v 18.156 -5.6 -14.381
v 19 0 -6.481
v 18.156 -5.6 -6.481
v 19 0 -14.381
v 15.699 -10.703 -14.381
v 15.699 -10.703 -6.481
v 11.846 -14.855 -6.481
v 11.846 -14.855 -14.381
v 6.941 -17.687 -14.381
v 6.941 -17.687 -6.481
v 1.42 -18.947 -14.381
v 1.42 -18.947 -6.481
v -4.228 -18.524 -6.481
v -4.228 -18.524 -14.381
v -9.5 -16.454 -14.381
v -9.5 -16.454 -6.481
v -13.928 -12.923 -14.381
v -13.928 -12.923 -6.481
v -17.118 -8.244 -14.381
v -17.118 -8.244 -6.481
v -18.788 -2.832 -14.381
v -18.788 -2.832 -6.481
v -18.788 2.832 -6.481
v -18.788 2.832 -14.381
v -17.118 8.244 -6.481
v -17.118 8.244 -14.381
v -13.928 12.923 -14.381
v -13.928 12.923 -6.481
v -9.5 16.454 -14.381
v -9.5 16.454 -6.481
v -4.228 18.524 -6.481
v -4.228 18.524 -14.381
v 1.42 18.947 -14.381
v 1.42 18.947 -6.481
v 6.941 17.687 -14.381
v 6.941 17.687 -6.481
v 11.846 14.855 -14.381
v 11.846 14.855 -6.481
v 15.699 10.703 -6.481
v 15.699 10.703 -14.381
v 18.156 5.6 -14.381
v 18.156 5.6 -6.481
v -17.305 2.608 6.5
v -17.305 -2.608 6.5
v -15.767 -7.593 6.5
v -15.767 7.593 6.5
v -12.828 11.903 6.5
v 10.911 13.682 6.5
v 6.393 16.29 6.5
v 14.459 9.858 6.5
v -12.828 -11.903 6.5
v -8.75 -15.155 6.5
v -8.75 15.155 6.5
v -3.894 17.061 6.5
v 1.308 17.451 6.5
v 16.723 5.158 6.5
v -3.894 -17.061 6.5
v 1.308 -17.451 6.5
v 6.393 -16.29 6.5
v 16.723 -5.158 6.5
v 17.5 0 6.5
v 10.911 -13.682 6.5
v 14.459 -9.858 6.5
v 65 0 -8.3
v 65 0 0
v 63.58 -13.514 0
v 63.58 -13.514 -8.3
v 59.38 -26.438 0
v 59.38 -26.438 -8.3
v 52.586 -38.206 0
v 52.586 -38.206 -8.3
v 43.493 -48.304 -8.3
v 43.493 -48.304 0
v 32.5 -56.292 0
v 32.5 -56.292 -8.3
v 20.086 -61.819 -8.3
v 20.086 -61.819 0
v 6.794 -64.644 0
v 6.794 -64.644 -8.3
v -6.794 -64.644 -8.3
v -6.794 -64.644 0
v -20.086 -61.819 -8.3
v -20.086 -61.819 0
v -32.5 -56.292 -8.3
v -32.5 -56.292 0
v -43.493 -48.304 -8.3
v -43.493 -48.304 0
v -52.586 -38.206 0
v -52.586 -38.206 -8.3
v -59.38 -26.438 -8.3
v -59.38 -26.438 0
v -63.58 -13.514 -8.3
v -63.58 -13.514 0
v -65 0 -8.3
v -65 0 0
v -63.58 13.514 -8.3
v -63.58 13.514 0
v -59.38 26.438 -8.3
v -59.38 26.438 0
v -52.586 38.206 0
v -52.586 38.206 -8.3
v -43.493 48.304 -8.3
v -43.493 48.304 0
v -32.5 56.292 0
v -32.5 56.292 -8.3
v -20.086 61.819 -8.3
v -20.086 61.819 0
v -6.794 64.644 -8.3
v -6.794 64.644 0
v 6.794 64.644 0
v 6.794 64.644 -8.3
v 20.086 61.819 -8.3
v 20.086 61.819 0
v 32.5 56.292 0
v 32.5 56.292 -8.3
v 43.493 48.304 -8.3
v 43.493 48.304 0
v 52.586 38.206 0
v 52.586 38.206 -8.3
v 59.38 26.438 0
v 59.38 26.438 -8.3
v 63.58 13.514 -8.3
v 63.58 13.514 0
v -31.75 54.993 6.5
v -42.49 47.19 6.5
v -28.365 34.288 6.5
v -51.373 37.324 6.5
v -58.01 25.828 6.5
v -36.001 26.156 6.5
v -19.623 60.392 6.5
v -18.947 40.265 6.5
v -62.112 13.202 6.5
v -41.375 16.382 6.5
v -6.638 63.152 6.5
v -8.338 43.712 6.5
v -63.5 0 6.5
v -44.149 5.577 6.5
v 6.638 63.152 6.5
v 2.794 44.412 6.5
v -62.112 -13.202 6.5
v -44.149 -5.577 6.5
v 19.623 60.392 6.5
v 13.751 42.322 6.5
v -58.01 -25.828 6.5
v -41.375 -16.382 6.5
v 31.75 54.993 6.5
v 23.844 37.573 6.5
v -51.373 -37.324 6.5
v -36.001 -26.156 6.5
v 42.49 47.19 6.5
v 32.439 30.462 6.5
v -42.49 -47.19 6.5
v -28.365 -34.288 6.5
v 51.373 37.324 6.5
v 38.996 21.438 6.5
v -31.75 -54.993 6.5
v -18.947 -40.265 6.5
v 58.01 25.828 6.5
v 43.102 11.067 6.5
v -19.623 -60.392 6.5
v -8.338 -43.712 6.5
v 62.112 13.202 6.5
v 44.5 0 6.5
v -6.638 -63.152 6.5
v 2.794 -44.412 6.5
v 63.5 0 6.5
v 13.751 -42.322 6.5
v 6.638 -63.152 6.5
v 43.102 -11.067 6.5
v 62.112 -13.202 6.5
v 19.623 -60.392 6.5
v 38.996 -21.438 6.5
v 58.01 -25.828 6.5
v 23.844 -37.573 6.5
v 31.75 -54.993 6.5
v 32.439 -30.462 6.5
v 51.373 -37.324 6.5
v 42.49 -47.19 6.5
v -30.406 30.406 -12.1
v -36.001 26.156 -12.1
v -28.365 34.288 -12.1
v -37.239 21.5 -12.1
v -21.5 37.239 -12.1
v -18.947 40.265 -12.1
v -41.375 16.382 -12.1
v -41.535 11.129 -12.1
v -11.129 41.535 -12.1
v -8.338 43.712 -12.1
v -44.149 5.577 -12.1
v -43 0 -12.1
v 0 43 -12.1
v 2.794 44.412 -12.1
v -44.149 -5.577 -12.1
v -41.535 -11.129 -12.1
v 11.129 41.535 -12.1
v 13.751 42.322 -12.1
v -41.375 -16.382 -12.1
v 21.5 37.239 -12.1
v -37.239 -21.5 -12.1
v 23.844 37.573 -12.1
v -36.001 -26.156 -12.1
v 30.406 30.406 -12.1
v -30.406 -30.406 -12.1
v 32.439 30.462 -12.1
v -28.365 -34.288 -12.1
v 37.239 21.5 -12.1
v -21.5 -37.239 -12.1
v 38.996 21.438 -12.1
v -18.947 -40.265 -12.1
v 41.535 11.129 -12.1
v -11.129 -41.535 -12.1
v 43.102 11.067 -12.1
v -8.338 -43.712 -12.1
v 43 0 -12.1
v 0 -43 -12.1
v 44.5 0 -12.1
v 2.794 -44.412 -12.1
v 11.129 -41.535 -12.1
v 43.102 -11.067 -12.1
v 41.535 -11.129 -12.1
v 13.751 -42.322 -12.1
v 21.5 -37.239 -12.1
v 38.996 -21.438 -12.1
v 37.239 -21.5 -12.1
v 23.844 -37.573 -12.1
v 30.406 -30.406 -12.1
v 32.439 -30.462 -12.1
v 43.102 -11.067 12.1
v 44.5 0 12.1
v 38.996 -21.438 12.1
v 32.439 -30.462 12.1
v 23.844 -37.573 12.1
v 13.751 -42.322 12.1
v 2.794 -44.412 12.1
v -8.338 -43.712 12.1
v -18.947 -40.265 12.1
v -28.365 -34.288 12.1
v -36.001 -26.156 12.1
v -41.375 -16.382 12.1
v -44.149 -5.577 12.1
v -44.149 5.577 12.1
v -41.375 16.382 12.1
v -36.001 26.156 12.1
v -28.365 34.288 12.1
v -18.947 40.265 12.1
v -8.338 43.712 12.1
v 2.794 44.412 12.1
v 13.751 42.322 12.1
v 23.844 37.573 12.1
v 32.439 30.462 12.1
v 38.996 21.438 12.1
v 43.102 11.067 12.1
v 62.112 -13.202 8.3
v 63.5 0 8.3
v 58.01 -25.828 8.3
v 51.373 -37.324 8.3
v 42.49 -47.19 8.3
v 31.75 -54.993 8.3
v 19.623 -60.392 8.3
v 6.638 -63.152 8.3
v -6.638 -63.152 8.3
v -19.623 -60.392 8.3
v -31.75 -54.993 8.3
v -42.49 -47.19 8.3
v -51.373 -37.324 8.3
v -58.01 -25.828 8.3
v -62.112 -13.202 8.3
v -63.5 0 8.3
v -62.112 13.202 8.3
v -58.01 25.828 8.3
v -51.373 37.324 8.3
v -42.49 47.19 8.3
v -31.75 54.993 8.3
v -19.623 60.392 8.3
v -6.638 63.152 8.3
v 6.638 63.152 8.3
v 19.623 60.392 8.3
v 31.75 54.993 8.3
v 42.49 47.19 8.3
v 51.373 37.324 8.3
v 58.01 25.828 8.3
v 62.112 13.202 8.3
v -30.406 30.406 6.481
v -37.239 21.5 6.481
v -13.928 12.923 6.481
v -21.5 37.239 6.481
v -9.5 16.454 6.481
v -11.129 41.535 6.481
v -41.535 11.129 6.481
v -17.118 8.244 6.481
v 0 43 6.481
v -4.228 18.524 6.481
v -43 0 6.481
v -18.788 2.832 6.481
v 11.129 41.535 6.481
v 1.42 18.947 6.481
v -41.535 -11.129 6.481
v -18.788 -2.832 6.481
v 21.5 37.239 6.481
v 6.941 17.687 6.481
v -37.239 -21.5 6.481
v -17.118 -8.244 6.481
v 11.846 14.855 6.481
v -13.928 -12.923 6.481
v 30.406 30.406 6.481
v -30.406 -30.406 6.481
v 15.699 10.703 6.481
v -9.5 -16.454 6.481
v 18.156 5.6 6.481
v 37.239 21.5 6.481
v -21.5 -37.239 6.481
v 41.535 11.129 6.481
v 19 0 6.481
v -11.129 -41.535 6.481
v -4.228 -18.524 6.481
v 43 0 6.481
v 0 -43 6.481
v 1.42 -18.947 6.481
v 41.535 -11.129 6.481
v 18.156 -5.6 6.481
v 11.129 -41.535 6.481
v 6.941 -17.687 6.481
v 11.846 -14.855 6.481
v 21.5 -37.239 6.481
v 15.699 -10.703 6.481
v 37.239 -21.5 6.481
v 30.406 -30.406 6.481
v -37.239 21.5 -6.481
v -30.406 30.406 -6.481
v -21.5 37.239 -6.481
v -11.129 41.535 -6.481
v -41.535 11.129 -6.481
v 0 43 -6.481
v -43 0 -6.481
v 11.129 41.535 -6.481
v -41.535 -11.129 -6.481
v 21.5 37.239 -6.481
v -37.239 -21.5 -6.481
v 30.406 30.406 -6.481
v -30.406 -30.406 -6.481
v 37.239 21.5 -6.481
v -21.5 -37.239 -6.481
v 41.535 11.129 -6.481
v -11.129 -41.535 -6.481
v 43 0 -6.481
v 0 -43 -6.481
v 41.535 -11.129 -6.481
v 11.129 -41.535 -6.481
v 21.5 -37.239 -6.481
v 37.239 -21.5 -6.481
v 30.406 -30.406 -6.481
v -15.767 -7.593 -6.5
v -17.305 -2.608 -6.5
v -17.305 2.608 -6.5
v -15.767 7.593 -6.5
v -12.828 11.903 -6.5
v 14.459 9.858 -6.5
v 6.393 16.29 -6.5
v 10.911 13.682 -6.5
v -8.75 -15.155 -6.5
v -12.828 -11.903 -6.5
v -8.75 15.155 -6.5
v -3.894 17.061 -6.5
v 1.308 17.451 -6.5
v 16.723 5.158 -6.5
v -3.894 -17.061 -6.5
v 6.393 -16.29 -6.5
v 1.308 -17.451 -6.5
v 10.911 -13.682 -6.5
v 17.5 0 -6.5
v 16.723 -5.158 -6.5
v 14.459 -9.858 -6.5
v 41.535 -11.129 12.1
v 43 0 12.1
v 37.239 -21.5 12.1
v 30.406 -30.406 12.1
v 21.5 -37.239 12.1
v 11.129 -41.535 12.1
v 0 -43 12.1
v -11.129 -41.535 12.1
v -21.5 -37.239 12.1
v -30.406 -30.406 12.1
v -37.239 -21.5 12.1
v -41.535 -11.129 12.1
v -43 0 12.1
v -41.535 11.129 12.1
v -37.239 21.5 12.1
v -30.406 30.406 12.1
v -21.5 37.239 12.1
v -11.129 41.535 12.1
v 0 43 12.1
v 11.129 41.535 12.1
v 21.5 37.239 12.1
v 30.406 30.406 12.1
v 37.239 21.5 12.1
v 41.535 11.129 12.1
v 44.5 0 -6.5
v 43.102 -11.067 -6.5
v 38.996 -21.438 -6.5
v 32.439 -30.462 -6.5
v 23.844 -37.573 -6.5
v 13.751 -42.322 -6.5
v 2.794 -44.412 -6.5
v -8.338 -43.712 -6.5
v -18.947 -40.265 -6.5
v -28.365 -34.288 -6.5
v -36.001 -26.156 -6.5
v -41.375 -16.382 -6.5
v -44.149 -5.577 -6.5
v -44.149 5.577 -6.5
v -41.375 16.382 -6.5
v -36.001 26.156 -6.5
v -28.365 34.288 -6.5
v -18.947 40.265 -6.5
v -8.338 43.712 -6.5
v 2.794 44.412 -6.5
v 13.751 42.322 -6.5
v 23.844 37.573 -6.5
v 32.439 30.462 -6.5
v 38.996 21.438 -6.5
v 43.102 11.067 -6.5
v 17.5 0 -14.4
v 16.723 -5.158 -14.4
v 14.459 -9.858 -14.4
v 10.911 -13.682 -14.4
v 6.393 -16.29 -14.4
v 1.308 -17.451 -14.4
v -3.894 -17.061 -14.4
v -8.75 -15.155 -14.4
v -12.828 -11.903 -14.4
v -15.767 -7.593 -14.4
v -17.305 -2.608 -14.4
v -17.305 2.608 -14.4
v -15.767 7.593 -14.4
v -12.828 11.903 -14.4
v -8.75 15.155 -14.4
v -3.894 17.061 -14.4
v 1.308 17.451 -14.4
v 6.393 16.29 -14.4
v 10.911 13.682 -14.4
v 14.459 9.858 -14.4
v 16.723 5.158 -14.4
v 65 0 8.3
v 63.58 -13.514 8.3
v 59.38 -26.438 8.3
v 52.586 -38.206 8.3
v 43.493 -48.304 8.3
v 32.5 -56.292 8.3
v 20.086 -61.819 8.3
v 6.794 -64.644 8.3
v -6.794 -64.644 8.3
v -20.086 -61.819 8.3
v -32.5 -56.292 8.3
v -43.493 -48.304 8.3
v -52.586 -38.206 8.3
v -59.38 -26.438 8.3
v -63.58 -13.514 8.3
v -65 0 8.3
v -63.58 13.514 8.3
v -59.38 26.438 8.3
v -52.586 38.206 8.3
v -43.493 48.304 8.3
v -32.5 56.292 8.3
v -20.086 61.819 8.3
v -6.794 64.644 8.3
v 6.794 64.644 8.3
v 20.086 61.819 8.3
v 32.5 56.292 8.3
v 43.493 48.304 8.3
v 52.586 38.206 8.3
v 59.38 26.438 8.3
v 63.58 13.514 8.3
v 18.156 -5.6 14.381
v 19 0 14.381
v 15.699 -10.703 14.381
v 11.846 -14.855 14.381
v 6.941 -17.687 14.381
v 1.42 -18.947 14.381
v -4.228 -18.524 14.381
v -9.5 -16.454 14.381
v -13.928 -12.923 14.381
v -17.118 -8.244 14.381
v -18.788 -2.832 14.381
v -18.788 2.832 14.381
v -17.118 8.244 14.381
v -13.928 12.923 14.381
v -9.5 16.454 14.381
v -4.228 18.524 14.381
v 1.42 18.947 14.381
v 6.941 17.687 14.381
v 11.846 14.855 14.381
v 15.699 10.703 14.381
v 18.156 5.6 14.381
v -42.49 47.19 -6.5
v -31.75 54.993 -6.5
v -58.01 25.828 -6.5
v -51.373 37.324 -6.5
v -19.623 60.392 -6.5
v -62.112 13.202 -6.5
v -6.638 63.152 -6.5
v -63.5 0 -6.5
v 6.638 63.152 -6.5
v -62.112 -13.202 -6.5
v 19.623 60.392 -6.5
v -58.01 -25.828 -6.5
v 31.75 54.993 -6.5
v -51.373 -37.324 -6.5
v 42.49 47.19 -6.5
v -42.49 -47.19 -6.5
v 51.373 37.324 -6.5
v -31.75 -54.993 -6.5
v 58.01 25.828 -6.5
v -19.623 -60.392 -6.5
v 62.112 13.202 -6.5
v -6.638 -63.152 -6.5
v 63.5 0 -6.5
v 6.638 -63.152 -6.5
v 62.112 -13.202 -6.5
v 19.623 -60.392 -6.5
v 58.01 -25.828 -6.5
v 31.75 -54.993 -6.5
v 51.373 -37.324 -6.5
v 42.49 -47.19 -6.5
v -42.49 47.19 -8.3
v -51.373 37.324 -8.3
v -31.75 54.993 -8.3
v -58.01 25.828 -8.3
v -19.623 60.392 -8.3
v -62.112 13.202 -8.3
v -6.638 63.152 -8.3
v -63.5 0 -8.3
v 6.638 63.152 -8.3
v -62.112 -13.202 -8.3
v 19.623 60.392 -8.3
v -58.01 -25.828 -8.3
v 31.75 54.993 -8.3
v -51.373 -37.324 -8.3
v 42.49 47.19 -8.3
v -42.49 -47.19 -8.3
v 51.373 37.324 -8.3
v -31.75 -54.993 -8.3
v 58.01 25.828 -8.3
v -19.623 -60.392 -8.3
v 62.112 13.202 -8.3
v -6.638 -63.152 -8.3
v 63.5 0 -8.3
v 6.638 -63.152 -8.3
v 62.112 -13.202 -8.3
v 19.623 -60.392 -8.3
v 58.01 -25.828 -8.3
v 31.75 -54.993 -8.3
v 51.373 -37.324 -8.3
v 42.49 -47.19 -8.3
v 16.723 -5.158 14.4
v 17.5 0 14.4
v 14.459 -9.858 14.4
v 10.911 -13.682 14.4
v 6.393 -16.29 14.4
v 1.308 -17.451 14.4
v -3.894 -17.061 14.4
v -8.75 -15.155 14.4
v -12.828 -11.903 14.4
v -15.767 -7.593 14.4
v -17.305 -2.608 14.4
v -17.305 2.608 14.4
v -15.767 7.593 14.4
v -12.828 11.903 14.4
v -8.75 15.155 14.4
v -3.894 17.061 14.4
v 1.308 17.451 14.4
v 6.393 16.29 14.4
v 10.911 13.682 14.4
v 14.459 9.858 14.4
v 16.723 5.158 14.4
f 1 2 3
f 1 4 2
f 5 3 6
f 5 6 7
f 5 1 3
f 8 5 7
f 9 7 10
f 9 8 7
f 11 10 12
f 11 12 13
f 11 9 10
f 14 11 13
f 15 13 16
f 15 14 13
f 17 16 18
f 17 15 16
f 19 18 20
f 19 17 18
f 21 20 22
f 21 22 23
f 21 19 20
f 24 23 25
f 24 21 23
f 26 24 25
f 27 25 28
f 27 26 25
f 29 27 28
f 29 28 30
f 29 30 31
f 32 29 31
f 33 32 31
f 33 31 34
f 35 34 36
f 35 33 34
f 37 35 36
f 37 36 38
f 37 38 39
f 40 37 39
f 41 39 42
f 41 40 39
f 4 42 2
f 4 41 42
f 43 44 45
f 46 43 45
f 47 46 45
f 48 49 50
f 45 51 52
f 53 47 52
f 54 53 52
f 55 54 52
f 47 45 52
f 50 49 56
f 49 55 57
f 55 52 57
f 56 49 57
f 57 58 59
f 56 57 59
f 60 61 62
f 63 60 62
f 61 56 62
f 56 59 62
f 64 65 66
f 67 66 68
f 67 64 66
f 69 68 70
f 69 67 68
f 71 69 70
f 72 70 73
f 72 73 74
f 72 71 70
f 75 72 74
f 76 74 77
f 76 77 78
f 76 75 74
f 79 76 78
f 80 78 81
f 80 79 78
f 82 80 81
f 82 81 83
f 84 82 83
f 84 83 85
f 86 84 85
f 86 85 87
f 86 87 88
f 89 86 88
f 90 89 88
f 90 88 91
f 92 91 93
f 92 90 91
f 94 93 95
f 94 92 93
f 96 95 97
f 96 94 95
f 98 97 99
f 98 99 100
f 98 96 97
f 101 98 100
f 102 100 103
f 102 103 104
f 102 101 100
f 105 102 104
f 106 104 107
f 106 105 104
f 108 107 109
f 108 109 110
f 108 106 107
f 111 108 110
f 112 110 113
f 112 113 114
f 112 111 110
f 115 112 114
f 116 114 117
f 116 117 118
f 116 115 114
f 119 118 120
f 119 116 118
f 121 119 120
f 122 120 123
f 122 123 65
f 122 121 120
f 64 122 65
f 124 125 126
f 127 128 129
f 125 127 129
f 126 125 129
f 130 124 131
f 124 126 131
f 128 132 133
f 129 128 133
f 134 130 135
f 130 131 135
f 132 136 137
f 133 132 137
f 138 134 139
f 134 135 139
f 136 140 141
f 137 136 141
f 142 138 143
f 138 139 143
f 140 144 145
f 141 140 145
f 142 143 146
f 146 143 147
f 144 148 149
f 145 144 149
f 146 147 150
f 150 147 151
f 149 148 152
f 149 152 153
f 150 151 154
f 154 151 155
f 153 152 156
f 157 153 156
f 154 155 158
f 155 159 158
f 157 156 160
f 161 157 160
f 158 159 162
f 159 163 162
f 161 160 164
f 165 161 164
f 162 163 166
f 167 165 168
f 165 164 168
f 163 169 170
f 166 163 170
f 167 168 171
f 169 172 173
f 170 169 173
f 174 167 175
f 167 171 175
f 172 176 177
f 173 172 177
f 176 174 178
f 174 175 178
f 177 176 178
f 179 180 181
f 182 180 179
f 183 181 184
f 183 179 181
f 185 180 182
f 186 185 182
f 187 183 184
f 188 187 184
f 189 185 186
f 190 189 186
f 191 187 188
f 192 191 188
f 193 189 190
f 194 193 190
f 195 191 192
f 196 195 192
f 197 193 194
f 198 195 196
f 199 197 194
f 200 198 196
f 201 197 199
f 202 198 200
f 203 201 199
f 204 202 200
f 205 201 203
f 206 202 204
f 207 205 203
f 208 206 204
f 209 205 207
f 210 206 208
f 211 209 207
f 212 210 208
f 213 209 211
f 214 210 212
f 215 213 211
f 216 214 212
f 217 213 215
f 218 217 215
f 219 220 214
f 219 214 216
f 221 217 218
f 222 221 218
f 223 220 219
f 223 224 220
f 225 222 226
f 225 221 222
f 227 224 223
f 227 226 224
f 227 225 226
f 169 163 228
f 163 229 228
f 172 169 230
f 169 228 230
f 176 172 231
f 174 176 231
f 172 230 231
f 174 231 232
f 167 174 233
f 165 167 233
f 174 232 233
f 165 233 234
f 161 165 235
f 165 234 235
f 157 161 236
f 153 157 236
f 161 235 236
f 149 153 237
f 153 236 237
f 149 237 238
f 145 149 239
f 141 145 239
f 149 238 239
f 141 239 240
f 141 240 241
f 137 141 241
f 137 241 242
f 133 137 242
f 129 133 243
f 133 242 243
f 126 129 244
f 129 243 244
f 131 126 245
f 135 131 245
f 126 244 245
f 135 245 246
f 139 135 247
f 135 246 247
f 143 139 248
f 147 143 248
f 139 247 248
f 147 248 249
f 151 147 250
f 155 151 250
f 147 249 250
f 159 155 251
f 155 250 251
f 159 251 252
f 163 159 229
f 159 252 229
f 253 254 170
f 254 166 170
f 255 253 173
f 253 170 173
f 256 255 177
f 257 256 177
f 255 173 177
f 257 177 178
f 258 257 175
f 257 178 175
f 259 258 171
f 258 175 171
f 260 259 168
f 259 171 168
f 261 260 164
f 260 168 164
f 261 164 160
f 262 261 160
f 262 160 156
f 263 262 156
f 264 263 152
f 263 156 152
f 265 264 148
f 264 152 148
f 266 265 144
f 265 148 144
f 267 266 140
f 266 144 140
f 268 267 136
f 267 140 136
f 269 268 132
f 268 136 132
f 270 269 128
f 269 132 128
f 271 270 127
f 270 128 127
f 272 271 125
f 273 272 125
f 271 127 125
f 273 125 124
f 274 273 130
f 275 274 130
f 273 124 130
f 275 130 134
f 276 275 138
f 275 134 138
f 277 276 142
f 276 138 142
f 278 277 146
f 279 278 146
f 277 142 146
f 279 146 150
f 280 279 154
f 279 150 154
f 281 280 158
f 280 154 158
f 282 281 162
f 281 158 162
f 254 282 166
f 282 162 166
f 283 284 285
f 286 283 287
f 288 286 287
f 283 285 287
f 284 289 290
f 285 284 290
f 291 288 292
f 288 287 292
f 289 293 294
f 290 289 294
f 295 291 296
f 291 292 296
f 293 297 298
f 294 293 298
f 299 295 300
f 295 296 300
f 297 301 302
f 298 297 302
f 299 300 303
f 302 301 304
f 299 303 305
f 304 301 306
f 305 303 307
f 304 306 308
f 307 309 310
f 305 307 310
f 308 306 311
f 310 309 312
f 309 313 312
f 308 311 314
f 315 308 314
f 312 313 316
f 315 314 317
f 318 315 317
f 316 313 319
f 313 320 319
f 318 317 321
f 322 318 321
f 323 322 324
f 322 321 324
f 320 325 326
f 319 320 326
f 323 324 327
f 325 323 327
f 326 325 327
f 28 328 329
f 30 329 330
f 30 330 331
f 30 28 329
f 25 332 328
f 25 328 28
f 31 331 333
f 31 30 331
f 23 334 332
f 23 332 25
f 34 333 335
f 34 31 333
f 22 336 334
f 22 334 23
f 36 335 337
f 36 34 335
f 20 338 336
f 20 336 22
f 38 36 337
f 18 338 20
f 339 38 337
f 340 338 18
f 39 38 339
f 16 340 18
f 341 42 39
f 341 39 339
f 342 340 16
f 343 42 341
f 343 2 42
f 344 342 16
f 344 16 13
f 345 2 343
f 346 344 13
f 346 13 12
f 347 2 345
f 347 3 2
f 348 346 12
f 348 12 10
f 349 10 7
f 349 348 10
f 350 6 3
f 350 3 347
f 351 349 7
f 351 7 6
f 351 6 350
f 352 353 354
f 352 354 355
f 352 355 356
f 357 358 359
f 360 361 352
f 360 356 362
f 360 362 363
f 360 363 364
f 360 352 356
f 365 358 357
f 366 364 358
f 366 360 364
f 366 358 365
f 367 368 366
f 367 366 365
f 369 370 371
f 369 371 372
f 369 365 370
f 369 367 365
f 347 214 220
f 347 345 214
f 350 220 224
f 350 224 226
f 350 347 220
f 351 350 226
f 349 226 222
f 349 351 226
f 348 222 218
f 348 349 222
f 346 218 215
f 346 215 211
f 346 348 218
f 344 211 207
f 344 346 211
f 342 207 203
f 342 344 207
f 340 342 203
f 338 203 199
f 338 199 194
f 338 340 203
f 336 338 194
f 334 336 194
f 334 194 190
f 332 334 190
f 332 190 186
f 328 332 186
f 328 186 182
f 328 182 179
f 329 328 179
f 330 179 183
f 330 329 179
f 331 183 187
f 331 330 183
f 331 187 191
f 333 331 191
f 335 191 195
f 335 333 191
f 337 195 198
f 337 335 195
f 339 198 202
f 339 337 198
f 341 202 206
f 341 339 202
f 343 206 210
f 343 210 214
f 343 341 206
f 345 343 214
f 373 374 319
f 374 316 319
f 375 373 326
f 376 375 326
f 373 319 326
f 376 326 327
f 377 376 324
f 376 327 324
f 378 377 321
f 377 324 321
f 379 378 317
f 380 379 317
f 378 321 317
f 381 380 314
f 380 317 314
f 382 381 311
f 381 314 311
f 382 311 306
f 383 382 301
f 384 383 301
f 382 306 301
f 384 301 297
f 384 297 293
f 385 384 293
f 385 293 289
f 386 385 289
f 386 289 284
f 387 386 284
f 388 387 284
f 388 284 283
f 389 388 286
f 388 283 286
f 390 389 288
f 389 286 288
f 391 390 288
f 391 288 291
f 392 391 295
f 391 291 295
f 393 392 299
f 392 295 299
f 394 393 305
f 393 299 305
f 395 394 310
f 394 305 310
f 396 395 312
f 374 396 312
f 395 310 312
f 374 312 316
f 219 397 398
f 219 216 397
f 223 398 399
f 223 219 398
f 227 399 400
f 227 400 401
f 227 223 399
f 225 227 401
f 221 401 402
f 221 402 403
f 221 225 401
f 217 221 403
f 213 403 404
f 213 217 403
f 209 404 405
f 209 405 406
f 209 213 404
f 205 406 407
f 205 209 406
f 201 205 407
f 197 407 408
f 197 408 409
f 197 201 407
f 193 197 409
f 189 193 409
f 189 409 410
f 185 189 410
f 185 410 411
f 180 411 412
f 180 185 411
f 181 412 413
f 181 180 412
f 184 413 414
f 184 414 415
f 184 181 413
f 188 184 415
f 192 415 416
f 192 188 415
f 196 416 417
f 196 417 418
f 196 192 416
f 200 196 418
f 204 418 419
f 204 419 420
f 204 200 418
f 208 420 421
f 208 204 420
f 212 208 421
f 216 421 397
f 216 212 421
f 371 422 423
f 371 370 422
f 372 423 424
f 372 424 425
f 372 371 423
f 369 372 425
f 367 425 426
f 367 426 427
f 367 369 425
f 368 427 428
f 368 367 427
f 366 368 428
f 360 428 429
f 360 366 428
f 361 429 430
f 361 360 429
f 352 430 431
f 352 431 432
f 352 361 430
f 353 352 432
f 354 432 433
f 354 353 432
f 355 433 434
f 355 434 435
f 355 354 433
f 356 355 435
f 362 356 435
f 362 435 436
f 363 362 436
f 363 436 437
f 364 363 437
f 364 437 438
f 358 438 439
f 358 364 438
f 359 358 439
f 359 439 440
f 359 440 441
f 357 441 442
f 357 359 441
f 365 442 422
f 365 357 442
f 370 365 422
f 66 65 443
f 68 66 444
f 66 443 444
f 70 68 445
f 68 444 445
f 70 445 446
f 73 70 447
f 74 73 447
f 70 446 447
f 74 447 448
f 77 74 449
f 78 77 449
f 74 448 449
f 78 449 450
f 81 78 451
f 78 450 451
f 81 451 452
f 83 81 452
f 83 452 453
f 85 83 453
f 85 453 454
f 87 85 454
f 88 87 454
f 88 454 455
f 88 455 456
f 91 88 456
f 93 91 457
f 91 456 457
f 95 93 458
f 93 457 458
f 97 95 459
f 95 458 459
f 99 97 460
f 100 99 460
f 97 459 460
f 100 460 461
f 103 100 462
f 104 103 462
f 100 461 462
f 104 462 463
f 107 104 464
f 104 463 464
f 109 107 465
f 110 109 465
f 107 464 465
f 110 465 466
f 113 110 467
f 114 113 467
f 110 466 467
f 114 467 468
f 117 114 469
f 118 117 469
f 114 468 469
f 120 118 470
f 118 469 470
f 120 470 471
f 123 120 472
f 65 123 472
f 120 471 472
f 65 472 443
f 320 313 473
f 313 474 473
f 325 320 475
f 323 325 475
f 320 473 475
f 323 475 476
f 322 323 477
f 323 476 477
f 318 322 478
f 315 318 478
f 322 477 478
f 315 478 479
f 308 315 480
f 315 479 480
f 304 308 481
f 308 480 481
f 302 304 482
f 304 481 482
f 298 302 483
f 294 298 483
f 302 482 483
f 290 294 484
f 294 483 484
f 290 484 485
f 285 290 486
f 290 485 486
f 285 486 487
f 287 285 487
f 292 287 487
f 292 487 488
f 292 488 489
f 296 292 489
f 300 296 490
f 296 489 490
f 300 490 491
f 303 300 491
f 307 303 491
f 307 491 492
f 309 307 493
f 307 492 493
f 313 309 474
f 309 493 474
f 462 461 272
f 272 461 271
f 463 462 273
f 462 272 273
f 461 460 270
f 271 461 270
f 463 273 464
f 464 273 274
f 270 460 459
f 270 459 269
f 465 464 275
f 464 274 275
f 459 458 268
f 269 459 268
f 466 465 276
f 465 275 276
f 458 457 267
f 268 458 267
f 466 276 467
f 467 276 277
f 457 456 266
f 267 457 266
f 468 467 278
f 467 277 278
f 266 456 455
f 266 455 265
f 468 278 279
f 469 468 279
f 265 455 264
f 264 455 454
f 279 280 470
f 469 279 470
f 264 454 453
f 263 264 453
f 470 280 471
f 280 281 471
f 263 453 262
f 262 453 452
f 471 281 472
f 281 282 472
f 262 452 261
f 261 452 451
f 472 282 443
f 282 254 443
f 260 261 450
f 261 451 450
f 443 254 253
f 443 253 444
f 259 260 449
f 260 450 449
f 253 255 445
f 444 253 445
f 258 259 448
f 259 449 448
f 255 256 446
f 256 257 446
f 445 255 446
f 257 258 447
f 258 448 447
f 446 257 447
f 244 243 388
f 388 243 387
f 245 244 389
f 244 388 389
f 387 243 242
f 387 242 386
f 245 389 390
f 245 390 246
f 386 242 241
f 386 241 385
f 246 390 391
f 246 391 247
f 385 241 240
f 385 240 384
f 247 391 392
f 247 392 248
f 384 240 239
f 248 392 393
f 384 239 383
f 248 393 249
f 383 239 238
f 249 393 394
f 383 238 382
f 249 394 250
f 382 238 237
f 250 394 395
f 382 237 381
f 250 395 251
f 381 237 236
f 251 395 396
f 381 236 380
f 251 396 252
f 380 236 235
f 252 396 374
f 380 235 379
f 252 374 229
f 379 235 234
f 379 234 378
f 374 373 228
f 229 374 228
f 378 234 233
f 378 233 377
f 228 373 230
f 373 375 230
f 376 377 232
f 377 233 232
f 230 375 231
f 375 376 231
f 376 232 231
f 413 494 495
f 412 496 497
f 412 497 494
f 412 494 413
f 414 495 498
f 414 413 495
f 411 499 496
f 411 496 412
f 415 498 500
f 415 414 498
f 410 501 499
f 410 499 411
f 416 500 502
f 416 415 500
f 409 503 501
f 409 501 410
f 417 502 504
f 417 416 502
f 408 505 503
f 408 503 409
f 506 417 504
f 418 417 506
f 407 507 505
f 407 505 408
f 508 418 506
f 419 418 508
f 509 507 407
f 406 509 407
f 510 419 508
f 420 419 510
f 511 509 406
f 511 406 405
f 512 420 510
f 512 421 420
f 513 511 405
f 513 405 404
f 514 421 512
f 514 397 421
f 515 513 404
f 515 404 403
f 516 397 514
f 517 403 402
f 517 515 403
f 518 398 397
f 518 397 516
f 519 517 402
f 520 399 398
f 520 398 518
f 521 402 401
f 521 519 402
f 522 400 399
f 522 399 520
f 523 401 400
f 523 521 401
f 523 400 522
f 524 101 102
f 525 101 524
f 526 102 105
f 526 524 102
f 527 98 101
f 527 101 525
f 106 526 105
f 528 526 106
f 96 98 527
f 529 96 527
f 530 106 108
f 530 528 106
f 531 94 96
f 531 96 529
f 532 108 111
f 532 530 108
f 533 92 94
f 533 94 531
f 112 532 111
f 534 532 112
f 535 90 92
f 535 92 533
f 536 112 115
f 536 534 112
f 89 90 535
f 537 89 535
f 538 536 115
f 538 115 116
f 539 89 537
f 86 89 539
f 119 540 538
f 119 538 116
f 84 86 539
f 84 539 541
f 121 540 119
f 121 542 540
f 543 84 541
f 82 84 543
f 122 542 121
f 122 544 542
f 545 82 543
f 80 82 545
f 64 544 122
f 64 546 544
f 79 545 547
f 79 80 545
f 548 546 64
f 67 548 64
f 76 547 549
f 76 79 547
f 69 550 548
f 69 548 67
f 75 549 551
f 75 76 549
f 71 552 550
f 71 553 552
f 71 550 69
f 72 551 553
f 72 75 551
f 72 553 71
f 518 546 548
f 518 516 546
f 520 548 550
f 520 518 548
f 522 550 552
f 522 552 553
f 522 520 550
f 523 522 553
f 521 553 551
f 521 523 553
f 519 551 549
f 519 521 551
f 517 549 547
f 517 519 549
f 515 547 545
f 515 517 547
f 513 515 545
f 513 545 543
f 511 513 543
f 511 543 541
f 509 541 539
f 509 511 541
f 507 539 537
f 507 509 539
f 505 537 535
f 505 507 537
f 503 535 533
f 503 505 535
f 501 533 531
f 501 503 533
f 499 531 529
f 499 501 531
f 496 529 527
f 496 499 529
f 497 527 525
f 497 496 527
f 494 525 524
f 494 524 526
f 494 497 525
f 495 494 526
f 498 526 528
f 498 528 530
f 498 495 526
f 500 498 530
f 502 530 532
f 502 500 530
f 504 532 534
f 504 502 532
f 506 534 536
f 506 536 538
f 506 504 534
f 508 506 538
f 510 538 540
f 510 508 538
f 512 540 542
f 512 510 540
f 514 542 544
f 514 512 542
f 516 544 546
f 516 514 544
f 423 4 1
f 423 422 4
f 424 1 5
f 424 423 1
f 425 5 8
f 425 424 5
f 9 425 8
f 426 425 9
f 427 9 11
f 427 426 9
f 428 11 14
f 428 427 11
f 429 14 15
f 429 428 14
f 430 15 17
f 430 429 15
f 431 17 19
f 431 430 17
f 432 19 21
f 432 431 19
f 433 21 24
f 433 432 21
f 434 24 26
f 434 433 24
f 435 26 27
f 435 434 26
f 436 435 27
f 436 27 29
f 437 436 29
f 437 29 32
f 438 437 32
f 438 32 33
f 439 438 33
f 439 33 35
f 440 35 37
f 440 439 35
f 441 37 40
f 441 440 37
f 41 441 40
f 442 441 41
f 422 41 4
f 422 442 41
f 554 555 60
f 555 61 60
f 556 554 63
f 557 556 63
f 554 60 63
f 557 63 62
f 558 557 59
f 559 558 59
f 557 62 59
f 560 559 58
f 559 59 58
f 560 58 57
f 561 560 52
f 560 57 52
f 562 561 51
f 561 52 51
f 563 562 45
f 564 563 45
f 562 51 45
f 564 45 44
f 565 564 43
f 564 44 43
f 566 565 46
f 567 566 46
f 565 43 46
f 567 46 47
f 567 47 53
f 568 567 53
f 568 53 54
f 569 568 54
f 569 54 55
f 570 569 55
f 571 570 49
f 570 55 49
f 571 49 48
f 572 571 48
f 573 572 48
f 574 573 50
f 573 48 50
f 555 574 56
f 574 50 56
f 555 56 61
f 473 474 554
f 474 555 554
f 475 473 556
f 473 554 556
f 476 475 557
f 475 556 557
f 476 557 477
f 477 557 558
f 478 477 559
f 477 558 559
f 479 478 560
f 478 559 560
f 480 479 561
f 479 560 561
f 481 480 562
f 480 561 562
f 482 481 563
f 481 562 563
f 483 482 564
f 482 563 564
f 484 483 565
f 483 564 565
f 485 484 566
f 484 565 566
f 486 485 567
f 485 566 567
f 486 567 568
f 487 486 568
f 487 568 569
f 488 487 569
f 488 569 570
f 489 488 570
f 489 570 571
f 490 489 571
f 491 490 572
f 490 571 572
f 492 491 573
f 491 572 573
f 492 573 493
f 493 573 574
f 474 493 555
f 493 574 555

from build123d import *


with BuildPart() as f1:
    # F0 (on Front) → F1 (revolve)
    with BuildSketch(Plane.XZ):
        Polygon((0, 6.5), (0, 0), (65, 0), (65, 8.3), (63.5, 8.3), (63.5, 6.5), (44.5, 6.5), (44.5, 12.1), (43, 12.1), (43, 6.480602), (19, 6.480602), (19, 14.380602), (17.5, 14.4), (17.5, 6.5), align=None)
    revolve(axis=Axis((0, 0, 3.25), (0, 0, -1)))

    # F2: F1 across plane


with BuildPart() as f1_1:
    add(f1.part)
    add(f1.part.mirror(Plane.XY))


solid = f1_1.part
